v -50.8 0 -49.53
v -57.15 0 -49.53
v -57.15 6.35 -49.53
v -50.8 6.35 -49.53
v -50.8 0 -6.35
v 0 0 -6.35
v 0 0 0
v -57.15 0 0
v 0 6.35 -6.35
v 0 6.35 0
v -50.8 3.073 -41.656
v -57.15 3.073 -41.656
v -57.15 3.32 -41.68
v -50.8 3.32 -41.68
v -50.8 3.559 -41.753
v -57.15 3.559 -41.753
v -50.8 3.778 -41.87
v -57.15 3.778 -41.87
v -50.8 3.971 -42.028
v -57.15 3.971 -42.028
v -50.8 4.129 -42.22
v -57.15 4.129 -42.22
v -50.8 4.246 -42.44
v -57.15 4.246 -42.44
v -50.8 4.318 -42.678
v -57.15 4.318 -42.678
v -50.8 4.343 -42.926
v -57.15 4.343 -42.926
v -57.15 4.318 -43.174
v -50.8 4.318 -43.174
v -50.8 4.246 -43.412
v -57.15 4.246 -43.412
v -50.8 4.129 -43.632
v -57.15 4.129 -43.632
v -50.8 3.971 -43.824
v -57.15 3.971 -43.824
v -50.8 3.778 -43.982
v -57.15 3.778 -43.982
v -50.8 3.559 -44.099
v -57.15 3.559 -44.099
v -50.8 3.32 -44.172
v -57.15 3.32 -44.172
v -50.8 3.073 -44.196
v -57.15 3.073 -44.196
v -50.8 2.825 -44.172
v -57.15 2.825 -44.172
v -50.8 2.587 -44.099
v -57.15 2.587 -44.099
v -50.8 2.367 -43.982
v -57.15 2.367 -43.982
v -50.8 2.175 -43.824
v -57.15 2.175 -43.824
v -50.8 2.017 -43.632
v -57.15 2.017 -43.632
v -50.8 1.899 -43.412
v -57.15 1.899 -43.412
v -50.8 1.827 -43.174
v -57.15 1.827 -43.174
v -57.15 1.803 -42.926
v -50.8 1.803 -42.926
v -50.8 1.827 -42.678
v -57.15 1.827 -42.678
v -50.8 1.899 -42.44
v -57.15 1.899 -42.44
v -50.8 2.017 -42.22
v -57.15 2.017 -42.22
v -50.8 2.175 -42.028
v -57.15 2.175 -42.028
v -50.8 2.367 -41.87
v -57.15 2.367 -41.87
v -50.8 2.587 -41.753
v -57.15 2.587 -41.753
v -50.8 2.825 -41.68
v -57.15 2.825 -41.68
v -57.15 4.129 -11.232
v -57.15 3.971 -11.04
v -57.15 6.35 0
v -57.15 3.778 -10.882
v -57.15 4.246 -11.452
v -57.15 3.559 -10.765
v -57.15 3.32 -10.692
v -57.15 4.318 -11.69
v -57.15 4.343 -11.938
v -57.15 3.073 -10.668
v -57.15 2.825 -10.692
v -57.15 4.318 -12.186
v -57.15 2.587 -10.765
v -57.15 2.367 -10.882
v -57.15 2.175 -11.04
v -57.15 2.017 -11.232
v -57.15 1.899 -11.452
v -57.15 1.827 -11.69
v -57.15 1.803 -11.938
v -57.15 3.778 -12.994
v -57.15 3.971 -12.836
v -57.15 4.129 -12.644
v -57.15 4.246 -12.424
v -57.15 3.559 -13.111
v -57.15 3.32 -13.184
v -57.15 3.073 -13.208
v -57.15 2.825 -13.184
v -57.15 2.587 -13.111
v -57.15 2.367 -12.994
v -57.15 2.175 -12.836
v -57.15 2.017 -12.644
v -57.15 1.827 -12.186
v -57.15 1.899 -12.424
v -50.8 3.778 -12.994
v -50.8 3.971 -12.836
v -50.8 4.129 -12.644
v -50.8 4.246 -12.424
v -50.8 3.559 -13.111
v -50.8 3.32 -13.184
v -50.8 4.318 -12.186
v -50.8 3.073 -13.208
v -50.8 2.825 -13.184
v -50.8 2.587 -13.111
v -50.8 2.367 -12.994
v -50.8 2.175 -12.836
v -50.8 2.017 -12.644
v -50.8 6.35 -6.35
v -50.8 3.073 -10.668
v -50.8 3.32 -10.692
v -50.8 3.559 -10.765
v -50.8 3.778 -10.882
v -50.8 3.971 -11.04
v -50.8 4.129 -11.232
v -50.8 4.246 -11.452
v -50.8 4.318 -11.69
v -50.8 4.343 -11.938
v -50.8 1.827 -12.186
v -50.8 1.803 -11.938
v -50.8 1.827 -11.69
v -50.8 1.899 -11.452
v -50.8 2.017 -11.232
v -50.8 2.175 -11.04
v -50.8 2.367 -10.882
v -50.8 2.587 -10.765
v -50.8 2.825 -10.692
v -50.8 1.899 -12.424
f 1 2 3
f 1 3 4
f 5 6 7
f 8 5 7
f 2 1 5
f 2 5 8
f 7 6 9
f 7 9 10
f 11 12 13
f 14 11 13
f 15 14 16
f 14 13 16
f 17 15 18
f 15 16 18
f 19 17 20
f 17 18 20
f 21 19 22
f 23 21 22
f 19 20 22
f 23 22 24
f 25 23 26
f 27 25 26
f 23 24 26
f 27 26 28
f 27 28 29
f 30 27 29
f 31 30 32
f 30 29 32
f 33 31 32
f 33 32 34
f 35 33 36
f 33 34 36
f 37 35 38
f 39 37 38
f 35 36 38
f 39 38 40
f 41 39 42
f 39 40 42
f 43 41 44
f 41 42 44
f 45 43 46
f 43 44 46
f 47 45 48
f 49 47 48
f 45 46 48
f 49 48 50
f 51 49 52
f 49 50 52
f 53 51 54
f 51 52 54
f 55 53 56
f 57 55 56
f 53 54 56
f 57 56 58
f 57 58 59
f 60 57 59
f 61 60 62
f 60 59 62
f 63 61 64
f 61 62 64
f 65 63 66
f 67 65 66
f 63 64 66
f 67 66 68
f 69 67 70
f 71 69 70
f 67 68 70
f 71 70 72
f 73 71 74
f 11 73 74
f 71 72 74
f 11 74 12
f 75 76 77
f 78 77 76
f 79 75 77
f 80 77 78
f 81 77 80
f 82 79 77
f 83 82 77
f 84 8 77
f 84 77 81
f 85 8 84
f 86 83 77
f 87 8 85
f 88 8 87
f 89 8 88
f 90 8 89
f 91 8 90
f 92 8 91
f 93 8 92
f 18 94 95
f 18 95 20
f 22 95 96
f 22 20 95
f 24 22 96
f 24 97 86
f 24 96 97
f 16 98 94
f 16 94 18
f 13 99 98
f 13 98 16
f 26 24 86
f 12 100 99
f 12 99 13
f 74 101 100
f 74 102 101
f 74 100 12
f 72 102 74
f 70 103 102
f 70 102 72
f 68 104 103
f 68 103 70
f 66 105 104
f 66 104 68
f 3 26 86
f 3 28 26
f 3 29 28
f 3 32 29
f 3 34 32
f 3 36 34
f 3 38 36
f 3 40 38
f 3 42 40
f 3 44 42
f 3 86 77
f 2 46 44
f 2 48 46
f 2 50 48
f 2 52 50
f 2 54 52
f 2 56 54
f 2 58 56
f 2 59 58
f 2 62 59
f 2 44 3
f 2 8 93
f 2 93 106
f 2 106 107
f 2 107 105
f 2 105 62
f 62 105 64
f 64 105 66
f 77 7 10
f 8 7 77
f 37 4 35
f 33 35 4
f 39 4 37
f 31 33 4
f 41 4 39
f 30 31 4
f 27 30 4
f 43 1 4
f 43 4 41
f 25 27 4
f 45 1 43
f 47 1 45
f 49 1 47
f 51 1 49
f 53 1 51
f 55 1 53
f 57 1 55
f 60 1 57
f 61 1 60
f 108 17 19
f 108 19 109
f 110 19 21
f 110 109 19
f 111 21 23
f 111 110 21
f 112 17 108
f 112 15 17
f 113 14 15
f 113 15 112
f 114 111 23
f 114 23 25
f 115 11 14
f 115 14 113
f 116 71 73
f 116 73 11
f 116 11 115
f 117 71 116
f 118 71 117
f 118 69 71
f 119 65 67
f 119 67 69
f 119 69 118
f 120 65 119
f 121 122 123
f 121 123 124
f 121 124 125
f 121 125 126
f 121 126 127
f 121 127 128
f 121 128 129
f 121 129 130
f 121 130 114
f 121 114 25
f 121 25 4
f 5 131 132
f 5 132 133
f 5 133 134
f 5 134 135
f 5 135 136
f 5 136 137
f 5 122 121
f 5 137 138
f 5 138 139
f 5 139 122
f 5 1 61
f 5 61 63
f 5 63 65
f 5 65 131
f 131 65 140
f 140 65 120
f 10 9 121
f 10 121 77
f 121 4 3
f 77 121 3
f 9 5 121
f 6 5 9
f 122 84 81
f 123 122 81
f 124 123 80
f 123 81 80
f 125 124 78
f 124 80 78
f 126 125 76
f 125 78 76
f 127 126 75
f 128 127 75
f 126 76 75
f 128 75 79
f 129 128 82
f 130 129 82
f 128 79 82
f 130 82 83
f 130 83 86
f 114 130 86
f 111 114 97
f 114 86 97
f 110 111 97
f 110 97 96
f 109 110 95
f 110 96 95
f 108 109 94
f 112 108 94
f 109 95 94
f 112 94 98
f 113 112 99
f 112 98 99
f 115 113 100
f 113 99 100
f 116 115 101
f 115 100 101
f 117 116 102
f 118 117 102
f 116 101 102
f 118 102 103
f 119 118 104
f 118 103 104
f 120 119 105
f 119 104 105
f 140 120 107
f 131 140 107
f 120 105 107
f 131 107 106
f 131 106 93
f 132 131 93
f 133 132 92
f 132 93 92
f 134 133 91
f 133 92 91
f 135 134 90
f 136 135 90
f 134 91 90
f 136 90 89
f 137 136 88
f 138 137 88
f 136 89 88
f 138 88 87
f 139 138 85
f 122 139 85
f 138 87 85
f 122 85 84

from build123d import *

# Parameters (mm, degrees)
BOSS_EXTRUDE1_DEPTH = 6.35
SKETCH3_R           = 1.27
CUT_EXTRUDE2_DEPTH  = 6.35


with BuildPart() as part:
    # Sketch1 → Boss-Extrude1 (new body)
    with BuildSketch(Plane(origin=(0, 0, 0), x_dir=(1, 0, 0), z_dir=(0, 1, 0))):
        Polygon((0, 0), (-57.15, 0), (-57.15, 49.53), (-50.8, 49.53), (-50.8, 6.35), (0, 6.35), align=None)
    extrude(amount=BOSS_EXTRUDE1_DEPTH)

    # Sketch3 → Cut-Extrude2 (cut)
    with BuildSketch(Plane.ZY.offset(57.15)):
        with Locations((-42.926, 3.072725117)):
            Circle(SKETCH3_R)
        with Locations((-11.938, 3.072725117)):
            Circle(SKETCH3_R)
    extrude(amount=-CUT_EXTRUDE2_DEPTH, mode=Mode.SUBTRACT)


solid = part.part
